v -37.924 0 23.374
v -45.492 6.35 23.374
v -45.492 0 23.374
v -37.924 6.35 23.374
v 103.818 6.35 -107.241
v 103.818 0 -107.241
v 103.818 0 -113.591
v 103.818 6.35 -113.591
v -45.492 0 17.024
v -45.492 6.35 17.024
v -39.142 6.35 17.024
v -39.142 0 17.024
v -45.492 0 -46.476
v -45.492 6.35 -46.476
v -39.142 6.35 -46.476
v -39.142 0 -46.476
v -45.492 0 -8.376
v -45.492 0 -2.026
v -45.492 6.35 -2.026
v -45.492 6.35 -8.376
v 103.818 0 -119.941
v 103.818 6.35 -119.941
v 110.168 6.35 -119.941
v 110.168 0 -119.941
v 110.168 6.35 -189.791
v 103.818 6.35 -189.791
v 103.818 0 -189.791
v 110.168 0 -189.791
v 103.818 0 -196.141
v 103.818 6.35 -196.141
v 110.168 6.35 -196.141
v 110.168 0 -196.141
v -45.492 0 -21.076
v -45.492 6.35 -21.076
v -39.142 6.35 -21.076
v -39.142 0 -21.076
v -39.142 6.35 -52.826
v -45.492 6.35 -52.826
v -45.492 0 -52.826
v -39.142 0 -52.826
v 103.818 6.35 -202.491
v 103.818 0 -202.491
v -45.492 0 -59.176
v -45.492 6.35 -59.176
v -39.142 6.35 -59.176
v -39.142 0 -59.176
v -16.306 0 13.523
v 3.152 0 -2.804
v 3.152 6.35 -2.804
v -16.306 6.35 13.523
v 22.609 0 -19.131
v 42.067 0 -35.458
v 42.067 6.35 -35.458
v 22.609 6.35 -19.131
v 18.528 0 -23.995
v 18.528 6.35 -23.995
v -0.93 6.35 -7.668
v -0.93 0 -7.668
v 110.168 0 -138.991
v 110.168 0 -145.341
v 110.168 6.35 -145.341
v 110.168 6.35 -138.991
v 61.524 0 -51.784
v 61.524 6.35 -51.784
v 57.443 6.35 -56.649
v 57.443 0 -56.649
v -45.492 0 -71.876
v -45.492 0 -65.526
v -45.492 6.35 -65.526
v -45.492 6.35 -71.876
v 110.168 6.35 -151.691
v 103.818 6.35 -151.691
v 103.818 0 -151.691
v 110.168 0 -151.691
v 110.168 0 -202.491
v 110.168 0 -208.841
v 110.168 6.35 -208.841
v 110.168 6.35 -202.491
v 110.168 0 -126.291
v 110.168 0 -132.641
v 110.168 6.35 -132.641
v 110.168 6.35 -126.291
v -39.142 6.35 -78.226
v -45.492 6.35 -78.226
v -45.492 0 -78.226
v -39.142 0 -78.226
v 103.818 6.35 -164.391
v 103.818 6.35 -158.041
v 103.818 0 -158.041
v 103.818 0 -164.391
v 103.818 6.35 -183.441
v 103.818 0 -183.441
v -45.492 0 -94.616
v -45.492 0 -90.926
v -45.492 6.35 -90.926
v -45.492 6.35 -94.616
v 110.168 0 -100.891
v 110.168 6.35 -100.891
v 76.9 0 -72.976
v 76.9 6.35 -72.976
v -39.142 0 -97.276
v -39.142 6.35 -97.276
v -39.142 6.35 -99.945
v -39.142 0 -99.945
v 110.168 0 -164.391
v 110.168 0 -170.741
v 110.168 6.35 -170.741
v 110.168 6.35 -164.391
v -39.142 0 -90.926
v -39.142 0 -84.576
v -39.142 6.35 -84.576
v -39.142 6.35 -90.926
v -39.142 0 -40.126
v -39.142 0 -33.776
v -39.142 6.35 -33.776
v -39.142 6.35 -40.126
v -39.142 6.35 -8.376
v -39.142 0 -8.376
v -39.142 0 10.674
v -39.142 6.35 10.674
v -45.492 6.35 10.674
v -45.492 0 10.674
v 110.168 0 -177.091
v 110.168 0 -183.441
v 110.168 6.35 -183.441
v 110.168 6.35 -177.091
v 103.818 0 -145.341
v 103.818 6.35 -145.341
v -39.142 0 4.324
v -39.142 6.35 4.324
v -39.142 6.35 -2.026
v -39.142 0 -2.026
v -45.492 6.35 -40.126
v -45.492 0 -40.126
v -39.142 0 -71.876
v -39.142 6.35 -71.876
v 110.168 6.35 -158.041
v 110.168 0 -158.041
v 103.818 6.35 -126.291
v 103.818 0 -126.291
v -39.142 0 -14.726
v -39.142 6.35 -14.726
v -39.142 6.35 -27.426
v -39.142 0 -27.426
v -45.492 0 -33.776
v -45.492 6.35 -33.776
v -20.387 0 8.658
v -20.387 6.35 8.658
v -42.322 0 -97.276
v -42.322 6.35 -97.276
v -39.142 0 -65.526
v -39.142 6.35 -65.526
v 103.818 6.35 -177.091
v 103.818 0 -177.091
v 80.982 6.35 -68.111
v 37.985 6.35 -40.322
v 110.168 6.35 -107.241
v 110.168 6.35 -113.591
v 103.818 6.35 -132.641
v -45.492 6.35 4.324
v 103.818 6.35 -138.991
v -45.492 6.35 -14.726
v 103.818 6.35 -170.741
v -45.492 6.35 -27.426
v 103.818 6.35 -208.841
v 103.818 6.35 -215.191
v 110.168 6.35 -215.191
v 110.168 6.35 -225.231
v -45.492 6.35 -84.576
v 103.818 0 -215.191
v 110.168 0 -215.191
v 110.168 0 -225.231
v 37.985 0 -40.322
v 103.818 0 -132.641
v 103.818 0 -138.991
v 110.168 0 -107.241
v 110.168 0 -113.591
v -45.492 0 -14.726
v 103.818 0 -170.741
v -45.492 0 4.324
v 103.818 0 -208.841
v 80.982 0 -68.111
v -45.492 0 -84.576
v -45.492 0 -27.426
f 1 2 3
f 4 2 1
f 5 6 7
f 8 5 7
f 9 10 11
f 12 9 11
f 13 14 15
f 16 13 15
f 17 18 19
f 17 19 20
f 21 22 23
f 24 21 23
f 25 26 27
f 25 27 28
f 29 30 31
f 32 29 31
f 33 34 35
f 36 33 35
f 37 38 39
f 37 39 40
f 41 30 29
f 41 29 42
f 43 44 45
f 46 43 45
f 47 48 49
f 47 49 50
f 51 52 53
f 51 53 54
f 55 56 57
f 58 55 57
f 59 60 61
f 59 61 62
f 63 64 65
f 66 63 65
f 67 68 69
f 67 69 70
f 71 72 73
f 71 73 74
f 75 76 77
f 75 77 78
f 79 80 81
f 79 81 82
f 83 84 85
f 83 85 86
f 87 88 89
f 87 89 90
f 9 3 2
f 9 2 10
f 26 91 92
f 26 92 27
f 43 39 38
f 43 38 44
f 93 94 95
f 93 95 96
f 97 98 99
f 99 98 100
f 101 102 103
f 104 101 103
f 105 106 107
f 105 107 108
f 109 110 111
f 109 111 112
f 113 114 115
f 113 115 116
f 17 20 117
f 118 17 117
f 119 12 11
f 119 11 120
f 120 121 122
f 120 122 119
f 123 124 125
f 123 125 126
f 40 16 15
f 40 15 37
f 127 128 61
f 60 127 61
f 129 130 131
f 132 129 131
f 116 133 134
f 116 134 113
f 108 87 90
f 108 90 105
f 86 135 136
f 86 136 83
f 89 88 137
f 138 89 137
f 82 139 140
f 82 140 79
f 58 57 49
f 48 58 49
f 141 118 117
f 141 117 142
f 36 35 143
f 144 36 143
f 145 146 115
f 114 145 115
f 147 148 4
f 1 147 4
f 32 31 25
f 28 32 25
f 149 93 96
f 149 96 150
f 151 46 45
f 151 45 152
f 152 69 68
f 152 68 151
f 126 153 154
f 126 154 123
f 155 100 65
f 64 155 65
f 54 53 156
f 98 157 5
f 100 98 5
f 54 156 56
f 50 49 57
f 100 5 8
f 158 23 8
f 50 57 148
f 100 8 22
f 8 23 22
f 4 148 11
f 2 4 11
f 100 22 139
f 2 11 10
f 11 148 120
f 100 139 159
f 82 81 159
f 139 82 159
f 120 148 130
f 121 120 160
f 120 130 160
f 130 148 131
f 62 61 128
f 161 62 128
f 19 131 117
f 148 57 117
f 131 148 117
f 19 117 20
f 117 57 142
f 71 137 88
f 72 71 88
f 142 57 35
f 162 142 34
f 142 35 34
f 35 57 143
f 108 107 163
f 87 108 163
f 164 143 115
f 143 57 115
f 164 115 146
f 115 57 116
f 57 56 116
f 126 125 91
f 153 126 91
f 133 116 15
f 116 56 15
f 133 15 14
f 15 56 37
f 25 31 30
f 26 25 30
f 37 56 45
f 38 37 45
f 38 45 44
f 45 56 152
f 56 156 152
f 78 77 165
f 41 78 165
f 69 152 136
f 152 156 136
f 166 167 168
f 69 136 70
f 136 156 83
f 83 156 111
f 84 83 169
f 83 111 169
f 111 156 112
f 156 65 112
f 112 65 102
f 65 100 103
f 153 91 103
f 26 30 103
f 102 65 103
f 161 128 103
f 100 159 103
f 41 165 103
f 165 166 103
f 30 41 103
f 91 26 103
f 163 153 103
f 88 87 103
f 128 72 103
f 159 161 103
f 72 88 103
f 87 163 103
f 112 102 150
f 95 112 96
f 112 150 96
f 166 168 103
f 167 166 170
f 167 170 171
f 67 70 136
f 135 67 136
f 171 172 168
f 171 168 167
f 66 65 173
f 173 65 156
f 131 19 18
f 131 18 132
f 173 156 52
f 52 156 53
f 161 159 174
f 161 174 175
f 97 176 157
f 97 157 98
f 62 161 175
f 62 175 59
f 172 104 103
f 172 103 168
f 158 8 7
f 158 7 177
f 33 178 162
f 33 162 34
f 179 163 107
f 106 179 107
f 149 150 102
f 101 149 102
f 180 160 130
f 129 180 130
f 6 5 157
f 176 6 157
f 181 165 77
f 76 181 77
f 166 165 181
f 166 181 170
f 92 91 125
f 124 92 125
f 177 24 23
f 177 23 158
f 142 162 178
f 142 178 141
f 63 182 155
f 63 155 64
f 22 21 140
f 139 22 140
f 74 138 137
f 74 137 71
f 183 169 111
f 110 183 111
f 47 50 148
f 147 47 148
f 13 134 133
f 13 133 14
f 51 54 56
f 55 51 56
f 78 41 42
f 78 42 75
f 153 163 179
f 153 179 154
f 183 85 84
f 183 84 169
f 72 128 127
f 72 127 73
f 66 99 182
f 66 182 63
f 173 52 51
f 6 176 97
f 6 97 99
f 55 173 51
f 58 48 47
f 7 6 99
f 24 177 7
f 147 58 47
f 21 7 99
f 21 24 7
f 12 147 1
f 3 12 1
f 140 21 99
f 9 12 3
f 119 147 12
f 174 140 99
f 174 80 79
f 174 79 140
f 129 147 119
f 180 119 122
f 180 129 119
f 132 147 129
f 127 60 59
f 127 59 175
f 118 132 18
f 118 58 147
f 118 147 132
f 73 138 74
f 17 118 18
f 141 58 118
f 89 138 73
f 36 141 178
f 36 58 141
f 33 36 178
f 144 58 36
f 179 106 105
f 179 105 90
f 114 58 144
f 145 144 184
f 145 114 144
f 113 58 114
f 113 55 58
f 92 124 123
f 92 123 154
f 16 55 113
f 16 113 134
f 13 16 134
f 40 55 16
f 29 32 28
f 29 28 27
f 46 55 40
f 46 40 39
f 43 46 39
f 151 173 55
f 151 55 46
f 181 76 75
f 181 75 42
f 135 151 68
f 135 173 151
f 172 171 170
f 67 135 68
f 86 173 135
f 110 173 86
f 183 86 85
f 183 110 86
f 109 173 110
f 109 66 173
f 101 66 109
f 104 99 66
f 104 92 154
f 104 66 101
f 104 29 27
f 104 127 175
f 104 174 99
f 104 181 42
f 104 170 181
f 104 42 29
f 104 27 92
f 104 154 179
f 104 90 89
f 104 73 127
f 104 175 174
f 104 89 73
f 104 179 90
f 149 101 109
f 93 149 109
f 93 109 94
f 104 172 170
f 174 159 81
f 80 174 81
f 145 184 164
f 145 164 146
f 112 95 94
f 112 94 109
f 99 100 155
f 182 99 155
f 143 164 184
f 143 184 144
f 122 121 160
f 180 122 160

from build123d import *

# Parameters (mm, degrees)
BOSS_EXTRUDE1_DEPTH = 6.35
CUT_EXTRUDE1_DEPTH  = 7.35
SKETCH3_W           = 6.35
SKETCH3_H           = 6.35
CUT_EXTRUDE2_DEPTH  = 7.35
SKETCH4_W           = 12.7
SKETCH4_H           = 6.35
SKETCH4_W_2         = 6.35
CUT_EXTRUDE3_DEPTH  = 7.35


with BuildPart() as part:
    # Sketch1 → Boss-Extrude1 (new body)
    with BuildSketch(Plane(origin=(0, 0, 0), x_dir=(1, 0, 0), z_dir=(0, 1, 0))):
        Polygon((-45.492088676, -38.013071454), (-45.492088676, 94.616309142), (110.168142166, 225.23075143), (110.168142166, 92.601370834), align=None)
    extrude(amount=BOSS_EXTRUDE1_DEPTH)

    # Sketch2 → Cut-Extrude1 (cut, through all)
    with BuildSketch(Plane(origin=(0, 6.35, 0), x_dir=(1, 0, 0), z_dir=(0, 1, 0))):
        Polygon((-45.492088676, -38.013071454), (-16.305795393, -13.522863525), (-20.387496714, -8.658481312), (-49.573789997, -33.148689241), align=None)
        Polygon((-0.929967859, 7.668323974), (3.151733462, 2.803941761), (22.609262318, 19.130747047), (18.527560996, 23.995129261), align=None)
        Polygon((37.985089851, 40.321934547), (42.066791173, 35.457552333), (61.524320028, 51.784357619), (57.442618706, 56.648739833), align=None)
        Polygon((80.981848883, 68.111162905), (115.03252438, 96.683072155), (110.950823058, 101.547454369), (76.900147562, 72.975545119), align=None)
    extrude(amount=-CUT_EXTRUDE1_DEPTH, mode=Mode.SUBTRACT)

    # Sketch3 → Cut-Extrude2 (cut, through all)
    with BuildSketch(Plane(origin=(0, 6.35, 0), x_dir=(1, 0, 0), z_dir=(0, 1, 0))):
        with Locations((106.993142166, 135.815707121)):
            Rectangle(SKETCH3_W, SKETCH3_H)
        with Locations((106.993142166, 123.115707121)):
            Rectangle(SKETCH3_W, SKETCH3_H)
        with Locations((106.993142166, 110.415707121)):
            Rectangle(SKETCH3_W, SKETCH3_H)
        with Locations((106.993142166, 148.515707121)):
            Rectangle(SKETCH3_W, SKETCH3_H)
        with Locations((106.993142166, 173.915707121)):
            Rectangle(SKETCH3_W, SKETCH3_H)
        with Locations((106.993142166, 186.615707121)):
            Rectangle(SKETCH3_W, SKETCH3_H)
        with Locations((106.993142166, 212.015707121)):
            Rectangle(SKETCH3_W, SKETCH3_H)
        with Locations((106.993142166, 161.215707121)):
            Rectangle(SKETCH3_W, SKETCH3_H)
        with Locations((106.993142166, 199.315707121)):
            Rectangle(SKETCH3_W, SKETCH3_H)
    extrude(amount=-CUT_EXTRUDE2_DEPTH, mode=Mode.SUBTRACT)

    # Sketch4 → Cut-Extrude3 (cut, through all)
    with BuildSketch(Plane(origin=(0, 6.35, 0), x_dir=(1, 0, 0), z_dir=(0, 1, 0))):
        with Locations((-39.142088676, -26.548735167)):
            Rectangle(SKETCH4_W, SKETCH4_H)
        with Locations((-42.317088676, -1.148735167)):
            Rectangle(SKETCH4_W_2, SKETCH4_H)
        with Locations((-42.317088676, -13.848735167)):
            Rectangle(SKETCH4_W_2, SKETCH4_H)
        with Locations((-42.317088676, 11.551264833)):
            Rectangle(SKETCH4_W_2, SKETCH4_H)
        with Locations((-42.317088676, 24.251264833)):
            Rectangle(SKETCH4_W_2, SKETCH4_H)
        with Locations((-42.317088676, 36.951264833)):
            Rectangle(SKETCH4_W_2, SKETCH4_H)
        with Locations((-42.317088676, 49.651264833)):
            Rectangle(SKETCH4_W_2, SKETCH4_H)
        with Locations((-42.317088676, 62.351264833)):
            Rectangle(SKETCH4_W_2, SKETCH4_H)
        with Locations((-42.317088676, 75.051264833)):
            Rectangle(SKETCH4_W_2, SKETCH4_H)
        with Locations((-42.317088676, 87.751264833)):
            Rectangle(SKETCH4_W_2, SKETCH4_H)
        with Locations((-42.317088676, 100.451264833)):
            Rectangle(SKETCH4_W_2, SKETCH4_H)
    extrude(amount=-CUT_EXTRUDE3_DEPTH, mode=Mode.SUBTRACT)


solid = part.part
